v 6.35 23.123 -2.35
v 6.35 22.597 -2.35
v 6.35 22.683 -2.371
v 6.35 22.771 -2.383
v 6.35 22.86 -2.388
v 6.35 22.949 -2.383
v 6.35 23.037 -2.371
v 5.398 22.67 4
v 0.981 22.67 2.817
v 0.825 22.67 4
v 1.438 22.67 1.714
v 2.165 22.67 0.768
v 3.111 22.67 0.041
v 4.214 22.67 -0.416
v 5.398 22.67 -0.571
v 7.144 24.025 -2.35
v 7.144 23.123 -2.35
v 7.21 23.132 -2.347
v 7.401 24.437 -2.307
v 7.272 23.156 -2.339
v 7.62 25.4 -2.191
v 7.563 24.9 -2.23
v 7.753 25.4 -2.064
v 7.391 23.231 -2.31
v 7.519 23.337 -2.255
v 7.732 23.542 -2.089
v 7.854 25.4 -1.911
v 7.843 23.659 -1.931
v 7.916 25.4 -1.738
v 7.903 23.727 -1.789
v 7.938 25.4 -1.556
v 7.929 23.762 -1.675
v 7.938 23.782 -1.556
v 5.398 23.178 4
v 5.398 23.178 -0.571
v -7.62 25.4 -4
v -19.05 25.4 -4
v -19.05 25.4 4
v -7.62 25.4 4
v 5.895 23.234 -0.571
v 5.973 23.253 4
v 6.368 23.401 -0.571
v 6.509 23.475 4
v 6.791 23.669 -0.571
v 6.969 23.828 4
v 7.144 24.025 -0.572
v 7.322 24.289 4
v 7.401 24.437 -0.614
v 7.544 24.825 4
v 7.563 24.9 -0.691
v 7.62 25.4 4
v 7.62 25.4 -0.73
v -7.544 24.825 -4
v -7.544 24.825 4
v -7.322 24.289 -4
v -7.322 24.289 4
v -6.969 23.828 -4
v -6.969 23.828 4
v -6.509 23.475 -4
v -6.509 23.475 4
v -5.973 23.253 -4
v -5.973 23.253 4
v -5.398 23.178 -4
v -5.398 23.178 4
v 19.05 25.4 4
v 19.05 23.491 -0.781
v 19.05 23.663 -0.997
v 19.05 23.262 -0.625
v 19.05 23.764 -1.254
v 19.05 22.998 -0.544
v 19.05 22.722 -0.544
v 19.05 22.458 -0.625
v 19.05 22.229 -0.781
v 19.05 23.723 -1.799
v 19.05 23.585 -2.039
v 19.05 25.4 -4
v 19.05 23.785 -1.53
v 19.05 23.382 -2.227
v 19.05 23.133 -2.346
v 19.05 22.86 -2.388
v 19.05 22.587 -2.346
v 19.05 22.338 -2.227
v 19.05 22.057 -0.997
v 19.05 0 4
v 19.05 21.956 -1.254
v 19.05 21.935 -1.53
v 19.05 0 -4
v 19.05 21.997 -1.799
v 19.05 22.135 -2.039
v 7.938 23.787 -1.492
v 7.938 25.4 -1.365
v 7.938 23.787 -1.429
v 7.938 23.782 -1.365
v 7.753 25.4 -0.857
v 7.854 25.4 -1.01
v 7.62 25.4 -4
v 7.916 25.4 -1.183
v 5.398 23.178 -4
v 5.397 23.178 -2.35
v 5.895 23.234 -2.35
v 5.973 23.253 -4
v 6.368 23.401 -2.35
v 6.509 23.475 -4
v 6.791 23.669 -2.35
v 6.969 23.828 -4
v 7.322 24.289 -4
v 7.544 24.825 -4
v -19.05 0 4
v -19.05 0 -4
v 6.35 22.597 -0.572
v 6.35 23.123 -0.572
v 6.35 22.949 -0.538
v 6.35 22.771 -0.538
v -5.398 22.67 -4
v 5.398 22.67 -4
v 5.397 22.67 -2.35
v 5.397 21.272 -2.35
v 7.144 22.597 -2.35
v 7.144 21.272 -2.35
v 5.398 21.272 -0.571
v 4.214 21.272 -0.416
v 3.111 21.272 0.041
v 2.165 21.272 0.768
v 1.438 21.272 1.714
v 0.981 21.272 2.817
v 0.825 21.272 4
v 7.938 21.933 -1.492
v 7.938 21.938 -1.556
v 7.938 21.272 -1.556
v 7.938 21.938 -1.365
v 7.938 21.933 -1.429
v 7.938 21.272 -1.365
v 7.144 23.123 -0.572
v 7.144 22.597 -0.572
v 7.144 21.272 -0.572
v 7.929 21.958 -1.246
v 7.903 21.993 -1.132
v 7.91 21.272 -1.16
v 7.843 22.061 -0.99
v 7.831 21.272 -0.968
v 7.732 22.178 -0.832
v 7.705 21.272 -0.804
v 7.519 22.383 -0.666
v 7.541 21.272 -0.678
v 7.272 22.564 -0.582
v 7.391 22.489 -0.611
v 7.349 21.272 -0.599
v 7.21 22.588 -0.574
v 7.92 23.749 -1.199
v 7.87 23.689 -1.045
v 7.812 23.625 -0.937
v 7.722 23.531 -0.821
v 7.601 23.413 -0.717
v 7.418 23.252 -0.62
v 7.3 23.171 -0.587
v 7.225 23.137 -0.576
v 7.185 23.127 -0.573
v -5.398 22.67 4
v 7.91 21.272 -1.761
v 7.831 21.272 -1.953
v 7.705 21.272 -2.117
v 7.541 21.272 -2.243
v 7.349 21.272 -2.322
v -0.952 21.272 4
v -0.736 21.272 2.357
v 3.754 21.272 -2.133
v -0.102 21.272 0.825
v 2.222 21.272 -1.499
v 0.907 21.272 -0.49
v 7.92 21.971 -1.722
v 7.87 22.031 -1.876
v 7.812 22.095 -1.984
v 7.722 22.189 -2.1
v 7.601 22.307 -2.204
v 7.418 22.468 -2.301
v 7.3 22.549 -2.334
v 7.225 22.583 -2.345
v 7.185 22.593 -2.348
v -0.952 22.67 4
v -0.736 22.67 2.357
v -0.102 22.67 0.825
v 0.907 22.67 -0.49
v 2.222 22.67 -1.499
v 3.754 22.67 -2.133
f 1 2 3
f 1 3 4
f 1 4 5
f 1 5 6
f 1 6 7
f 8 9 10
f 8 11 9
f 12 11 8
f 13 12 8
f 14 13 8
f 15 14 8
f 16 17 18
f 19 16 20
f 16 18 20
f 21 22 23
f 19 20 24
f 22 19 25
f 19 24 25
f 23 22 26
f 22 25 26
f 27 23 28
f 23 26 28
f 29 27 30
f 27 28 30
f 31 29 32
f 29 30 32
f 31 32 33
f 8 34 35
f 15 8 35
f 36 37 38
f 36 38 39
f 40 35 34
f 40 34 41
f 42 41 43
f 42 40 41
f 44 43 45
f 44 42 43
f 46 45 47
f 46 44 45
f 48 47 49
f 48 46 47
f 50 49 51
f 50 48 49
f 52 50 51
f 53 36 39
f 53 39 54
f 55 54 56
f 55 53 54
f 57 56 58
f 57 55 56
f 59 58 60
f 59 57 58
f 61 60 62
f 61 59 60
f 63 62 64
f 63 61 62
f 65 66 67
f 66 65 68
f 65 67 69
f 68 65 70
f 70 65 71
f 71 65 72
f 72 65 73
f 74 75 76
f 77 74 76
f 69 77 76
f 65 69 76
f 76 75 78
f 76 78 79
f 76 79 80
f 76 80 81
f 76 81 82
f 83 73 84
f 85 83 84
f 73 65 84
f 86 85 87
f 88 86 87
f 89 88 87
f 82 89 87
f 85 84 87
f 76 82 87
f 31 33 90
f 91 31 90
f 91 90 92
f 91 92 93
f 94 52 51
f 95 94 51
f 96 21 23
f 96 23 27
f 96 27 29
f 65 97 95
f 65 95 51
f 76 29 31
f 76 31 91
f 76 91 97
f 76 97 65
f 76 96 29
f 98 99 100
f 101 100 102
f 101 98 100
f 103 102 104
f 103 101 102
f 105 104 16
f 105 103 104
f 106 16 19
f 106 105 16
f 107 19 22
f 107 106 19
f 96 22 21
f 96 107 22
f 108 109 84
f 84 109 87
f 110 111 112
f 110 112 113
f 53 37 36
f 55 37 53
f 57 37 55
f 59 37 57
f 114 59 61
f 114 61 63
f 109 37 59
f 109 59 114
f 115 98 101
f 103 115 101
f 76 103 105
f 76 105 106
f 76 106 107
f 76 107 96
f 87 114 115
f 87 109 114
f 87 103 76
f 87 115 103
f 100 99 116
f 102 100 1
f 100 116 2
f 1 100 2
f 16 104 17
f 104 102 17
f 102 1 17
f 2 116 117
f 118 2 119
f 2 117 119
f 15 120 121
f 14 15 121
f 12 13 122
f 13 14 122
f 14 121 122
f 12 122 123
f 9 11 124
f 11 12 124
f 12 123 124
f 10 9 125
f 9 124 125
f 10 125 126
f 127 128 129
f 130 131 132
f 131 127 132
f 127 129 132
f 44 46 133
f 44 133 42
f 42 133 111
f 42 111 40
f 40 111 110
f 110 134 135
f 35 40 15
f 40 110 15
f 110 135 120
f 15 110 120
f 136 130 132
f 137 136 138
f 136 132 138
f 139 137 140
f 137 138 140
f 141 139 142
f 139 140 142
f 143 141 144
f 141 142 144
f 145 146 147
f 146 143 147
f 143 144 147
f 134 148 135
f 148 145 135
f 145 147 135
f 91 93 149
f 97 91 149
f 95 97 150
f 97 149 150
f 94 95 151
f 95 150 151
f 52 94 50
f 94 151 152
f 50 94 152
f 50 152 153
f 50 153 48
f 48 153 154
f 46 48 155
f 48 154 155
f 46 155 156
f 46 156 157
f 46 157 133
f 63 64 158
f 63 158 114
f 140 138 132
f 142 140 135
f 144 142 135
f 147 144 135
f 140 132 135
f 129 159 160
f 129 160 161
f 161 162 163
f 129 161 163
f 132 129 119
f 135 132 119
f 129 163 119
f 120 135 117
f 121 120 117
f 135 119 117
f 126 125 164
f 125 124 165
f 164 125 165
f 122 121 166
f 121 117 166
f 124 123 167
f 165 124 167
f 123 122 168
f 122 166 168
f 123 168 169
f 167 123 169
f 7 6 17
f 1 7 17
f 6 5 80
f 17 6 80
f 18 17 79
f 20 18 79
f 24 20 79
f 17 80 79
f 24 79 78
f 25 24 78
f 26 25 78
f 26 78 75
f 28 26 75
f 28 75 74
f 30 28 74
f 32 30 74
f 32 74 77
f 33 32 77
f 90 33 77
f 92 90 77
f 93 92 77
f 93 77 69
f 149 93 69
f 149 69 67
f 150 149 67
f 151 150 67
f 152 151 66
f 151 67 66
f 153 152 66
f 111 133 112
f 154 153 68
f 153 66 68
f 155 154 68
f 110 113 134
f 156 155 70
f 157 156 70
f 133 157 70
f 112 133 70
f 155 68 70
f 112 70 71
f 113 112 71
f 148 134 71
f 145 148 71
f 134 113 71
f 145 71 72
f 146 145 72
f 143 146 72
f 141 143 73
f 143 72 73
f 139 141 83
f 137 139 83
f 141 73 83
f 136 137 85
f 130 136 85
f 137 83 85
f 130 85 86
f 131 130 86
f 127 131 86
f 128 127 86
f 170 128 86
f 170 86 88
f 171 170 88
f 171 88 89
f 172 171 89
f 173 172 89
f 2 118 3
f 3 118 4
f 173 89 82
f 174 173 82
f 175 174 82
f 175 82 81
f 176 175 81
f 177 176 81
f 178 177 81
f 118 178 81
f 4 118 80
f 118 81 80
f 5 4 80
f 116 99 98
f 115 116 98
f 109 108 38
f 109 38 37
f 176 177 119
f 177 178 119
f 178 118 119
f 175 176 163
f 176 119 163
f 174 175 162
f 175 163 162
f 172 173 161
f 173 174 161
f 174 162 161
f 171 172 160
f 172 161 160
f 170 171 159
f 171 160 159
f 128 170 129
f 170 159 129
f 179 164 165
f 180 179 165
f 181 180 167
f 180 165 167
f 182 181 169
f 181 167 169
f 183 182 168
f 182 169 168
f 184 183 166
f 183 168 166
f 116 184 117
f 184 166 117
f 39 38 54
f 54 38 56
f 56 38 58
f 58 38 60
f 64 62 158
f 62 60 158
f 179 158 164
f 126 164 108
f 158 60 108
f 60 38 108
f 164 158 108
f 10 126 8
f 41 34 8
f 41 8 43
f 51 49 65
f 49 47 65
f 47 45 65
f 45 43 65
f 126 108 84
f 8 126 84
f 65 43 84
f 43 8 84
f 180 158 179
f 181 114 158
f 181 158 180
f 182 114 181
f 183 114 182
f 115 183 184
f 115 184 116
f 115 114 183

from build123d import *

# Parameters (mm, degrees)
SKETCH1_W               = 38.1
SKETCH1_H               = 8.001
BOSS_EXTRUDE1_DEPTH     = 25.4
CUT_EXTRUDE1_DEPTH      = 25.4
CUT_EXTRUDE2_DEPTH      = 31.267193568
CUT_EXTRUDE2_DEPTH_BACK = 1.905
SKETCH5_R               = 0.9271
CUT_EXTRUDE3_DEPTH      = 12.7
SKETCH6_W               = 10.795
SKETCH6_H               = 8.001
CUT_EXTRUDE4_DEPTH      = 0.508


with BuildPart() as part:
    # Sketch1 → Boss-Extrude1 (new body)
    with BuildSketch(Plane(origin=(0, 0, 0), x_dir=(1, 0, 0), z_dir=(0, 1, 0))):
        Rectangle(SKETCH1_W, SKETCH1_H)
    extrude(amount=BOSS_EXTRUDE1_DEPTH)

    # Sketch2 → Cut-Extrude1 (cut)
    with BuildSketch(Plane(origin=(0, 0, -4.0005), x_dir=(-1, 0, 0), z_dir=(0, 0, -1))):
        with BuildLine():
            Line((5.3975, 23.1775), (-5.3975, 23.1775))
            ThreePointArc((-5.3975, 23.1775), (-7.62, 25.4), (-5.3975, 27.6225))
            Line((-5.3975, 27.6225), (5.3975, 27.6225))
            ThreePointArc((5.3975, 27.6225), (7.62, 25.4), (5.3975, 23.1775))
        make_face()
    extrude(amount=-CUT_EXTRUDE1_DEPTH, mode=Mode.SUBTRACT)

    # Sketch4 → Cut-Extrude2 (cut, two sides: drawn at the far end of the back side and taken through both)
    with BuildSketch(Plane(origin=(0, 23.1775, 0), x_dir=(1, 0, 0), z_dir=(0, 1, 0)).offset(-CUT_EXTRUDE2_DEPTH_BACK)):
        with BuildLine():
            Line((0.8255, -4.0005), (-0.9525, -4.0005))
            ThreePointArc((-0.9525, -4.0005), (0.907371939, 0.489628061), (5.3975, 2.3495))
            Line((5.3975, 2.3495), (7.14375, 2.3495))
            ThreePointArc((7.14375, 2.3495), (7.705016008, 2.117016008), (7.9375, 1.55575))
            Line((7.9375, 1.55575), (7.9375, 1.36525))
            ThreePointArc((7.9375, 1.36525), (7.705016008, 0.803983992), (7.14375, 0.5715))
            Line((7.14375, 0.5715), (5.3975, 0.5715))
            ThreePointArc((5.3975, 0.5715), (2.164607796, -0.767607796), (0.8255, -4.0005))
        make_face()
    extrude(amount=CUT_EXTRUDE2_DEPTH + CUT_EXTRUDE2_DEPTH_BACK, mode=Mode.SUBTRACT)

    # Sketch5 → Cut-Extrude3 (cut)
    with BuildSketch(Plane(origin=(19.05, 0, 0), x_dir=(0, 0, -1), z_dir=(1, 0, 0))):
        with Locations((1.4605, 22.86)):
            Circle(SKETCH5_R)
    extrude(amount=-CUT_EXTRUDE3_DEPTH, mode=Mode.SUBTRACT)

    # Sketch6 → Cut-Extrude4 (cut)
    with BuildSketch(Plane(origin=(0, 23.1775, 0), x_dir=(1, 0, 0), z_dir=(0, 1, 0))):
        Rectangle(SKETCH6_W, SKETCH6_H)
    extrude(amount=-CUT_EXTRUDE4_DEPTH, mode=Mode.SUBTRACT)


solid = part.part
